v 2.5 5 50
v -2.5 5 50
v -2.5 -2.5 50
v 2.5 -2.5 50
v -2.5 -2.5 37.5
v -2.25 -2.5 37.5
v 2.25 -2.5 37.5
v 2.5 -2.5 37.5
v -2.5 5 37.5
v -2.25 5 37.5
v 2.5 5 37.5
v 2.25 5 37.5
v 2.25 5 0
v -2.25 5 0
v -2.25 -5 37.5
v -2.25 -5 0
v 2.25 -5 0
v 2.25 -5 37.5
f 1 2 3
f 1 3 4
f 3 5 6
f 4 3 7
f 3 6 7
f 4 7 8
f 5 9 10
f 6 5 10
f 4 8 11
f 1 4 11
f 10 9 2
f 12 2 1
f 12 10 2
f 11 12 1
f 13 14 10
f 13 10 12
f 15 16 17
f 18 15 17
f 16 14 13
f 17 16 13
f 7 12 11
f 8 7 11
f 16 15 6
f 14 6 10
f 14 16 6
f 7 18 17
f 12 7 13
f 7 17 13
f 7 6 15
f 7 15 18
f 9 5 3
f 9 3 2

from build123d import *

# Parameters (mm, degrees)
SKETCH2_W           = 5
SKETCH2_H           = 7.5
BOSS_EXTRUDE2_DEPTH = 12.5
SKETCH1_W           = 4.5
SKETCH1_H           = 10
BOSS_EXTRUDE4_DEPTH = 37.5


with BuildPart() as part:
    # Sketch2 → Boss-Extrude2 (new body)
    with BuildSketch(Plane.XY.offset(37.5)):
        with Locations((0, 1.25)):
            Rectangle(SKETCH2_W, SKETCH2_H)
    extrude(amount=BOSS_EXTRUDE2_DEPTH)

    # Sketch1 → Boss-Extrude4 (add)
    with BuildSketch(Plane.XY):
        Rectangle(SKETCH1_W, SKETCH1_H)
    extrude(amount=BOSS_EXTRUDE4_DEPTH)


solid = part.part
